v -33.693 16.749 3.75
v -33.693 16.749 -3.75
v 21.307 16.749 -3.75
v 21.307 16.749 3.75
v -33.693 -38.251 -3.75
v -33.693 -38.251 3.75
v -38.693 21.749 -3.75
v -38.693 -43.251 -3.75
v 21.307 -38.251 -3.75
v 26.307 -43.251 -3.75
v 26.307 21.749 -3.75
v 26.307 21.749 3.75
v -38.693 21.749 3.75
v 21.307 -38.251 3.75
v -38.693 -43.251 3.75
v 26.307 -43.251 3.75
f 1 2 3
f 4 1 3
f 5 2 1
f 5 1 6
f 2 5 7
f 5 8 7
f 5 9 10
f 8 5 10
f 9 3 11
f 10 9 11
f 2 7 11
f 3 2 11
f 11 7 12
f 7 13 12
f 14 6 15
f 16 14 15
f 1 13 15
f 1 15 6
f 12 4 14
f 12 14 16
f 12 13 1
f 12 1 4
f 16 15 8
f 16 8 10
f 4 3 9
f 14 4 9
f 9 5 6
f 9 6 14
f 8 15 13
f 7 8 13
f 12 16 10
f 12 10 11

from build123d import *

# Parameters (mm, degrees)
SKETCH_W     = 65
SKETCH_H     = 65
PAD_DEPTH    = 3.75
SKETCH001_W  = 55
SKETCH001_H  = 55
POCKET_DEPTH = 7.501


with BuildPart() as part:
    # Sketch → Pad (new body, symmetric)
    with BuildSketch(Plane.XY):
        with Locations((-6.193032, -10.750862)):
            Rectangle(SKETCH_W, SKETCH_H)
    extrude(amount=PAD_DEPTH, both=True)

    # Sketch001 (on Face5 of Pad) → Pocket (cut, through all)
    with BuildSketch(Plane(origin=(0, 0, -3.75), x_dir=(1, 0, 0), z_dir=(0, 0, -1))):
        with Locations((-6.193032, 10.750862)):
            Rectangle(SKETCH001_W, SKETCH001_H)
    extrude(amount=-POCKET_DEPTH, mode=Mode.SUBTRACT)


solid = part.part
